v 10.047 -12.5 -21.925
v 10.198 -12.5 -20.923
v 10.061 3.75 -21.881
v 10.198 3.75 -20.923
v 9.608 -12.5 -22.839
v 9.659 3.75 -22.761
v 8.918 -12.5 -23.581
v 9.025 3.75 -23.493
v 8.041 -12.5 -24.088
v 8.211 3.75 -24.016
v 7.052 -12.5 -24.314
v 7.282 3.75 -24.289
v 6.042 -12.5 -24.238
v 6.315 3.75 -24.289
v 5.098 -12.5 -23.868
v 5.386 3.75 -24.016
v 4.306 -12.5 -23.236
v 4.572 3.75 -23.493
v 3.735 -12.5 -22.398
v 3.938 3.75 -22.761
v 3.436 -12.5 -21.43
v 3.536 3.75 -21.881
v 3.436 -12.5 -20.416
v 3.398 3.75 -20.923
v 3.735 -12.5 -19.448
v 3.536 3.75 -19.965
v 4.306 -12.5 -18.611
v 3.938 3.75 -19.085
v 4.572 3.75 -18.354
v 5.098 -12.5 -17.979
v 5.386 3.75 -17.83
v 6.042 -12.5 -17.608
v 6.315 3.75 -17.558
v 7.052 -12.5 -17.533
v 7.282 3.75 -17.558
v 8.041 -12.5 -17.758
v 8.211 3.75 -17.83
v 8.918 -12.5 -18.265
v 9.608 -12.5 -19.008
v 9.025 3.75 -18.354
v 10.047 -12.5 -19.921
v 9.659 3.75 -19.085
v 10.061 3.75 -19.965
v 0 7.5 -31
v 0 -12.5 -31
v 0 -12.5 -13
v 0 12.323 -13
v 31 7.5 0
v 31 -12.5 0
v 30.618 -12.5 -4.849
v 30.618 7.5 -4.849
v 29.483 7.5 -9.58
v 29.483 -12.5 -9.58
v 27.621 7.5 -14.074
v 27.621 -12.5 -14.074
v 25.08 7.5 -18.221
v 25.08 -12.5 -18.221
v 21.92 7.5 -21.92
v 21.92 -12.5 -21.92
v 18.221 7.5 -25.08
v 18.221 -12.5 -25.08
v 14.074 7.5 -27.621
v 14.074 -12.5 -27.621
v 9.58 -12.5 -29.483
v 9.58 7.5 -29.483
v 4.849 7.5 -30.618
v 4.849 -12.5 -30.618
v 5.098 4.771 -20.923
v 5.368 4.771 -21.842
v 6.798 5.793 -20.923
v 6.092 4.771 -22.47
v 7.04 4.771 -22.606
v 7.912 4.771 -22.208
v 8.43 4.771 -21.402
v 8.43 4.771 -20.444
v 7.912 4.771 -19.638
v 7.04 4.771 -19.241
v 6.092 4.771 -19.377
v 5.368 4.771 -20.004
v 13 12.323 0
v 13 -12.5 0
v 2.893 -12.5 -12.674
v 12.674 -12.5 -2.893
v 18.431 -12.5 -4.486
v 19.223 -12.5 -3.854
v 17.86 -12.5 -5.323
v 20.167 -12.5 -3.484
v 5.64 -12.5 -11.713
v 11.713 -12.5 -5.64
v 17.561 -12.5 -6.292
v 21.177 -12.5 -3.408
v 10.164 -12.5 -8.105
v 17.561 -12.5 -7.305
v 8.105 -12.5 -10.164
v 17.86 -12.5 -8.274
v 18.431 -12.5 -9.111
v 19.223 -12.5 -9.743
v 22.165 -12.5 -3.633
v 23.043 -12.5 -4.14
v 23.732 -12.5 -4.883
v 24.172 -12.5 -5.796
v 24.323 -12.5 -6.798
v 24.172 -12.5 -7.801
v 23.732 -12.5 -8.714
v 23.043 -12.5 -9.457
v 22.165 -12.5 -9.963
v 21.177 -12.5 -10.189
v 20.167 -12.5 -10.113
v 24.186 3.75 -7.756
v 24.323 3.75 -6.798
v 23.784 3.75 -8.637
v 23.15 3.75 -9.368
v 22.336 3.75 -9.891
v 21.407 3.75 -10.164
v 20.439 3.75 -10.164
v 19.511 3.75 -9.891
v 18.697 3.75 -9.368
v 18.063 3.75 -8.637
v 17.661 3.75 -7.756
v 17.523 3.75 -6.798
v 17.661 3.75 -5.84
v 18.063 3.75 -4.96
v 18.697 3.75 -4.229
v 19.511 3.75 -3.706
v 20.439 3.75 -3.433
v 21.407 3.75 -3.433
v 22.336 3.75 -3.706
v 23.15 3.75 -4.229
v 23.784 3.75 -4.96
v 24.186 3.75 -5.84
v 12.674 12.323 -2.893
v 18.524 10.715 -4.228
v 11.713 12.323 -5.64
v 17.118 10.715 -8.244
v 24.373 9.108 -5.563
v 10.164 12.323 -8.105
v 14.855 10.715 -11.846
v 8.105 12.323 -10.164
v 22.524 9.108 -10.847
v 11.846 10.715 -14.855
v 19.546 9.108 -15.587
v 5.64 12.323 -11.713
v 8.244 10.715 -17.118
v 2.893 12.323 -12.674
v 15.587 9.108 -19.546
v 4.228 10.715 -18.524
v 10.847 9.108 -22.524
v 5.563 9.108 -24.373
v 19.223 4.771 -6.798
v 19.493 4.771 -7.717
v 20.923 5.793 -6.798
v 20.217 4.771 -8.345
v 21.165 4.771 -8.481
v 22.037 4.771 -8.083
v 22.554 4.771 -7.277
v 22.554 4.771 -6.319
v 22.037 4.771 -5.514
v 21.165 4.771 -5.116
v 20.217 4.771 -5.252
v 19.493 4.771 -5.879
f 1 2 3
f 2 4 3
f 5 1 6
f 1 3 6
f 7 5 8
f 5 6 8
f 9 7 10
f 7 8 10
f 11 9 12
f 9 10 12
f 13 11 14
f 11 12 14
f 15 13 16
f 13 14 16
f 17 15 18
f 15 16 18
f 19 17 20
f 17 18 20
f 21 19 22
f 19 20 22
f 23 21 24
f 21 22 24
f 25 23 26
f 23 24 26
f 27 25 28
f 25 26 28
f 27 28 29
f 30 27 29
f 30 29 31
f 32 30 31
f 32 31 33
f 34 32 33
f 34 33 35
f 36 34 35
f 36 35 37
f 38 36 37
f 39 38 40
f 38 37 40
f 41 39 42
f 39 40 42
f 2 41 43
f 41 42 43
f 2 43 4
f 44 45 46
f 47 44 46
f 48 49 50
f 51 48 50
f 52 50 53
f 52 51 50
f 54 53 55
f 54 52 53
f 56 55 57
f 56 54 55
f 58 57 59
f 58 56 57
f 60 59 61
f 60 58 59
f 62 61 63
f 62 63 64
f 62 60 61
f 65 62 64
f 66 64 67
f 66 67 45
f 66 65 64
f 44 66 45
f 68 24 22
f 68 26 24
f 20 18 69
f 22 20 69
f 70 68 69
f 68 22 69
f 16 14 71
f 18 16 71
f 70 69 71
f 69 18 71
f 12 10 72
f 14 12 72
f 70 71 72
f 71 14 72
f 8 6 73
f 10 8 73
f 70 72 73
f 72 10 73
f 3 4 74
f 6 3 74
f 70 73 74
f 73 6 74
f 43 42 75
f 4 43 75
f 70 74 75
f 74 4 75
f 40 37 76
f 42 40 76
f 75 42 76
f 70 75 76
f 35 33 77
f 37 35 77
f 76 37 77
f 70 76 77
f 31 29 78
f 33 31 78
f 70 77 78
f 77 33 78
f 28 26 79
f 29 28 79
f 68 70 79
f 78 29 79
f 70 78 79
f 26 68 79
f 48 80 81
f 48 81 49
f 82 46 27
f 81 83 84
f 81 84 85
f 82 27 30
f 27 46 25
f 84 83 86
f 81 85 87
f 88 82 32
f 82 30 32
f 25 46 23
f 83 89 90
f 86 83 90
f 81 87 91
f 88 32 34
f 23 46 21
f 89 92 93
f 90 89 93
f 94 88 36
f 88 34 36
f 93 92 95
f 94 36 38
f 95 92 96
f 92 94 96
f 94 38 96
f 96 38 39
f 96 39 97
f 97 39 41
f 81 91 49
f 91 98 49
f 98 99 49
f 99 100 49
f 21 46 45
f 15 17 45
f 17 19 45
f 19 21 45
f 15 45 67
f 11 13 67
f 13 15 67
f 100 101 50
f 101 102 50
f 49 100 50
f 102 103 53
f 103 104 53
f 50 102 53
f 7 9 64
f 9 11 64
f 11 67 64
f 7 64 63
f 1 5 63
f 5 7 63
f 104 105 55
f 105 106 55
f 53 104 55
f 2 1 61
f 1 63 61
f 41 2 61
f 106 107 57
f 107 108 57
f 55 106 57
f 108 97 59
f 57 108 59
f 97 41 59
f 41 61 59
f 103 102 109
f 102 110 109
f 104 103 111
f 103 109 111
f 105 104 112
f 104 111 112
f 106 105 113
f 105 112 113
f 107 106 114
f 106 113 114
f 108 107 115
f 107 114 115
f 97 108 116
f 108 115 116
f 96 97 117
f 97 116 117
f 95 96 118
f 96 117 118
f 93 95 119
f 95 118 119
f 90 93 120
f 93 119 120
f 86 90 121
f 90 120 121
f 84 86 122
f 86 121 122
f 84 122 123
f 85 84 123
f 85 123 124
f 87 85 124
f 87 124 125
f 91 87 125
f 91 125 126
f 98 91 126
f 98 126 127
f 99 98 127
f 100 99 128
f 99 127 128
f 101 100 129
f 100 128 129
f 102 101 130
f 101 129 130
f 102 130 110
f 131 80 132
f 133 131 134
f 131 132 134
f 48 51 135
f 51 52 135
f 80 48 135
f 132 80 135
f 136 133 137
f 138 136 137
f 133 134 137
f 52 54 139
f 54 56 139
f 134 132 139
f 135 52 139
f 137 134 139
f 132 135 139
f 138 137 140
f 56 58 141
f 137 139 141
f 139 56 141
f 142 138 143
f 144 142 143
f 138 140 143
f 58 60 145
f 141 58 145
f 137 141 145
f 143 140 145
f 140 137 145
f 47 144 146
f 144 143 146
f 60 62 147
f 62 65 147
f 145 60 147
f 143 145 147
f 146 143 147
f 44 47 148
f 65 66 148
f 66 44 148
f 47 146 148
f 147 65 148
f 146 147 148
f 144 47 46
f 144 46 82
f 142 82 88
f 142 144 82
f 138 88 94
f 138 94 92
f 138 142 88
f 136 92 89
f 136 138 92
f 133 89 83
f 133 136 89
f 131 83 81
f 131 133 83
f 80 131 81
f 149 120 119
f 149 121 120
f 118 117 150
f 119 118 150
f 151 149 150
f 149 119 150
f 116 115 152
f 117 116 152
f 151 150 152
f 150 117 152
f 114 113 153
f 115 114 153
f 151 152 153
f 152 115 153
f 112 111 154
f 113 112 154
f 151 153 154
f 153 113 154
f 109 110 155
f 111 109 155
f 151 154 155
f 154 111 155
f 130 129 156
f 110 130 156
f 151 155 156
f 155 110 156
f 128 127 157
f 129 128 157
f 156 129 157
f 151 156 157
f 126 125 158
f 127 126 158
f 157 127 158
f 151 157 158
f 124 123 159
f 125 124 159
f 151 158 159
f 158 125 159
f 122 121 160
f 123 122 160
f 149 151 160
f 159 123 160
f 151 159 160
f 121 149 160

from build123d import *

# Parameters (mm, degrees)
AUFSATZ_LINEAR_AUSTRAGEN1_DEPTH = 12.5
M8_GEWINDEBOHRUNG1_D            = 6.8
M8_GEWINDEBOHRUNG1_DEPTH        = 16.25
M8_GEWINDEBOHRUNG1_TIP          = 2.042926105


with BuildPart() as part:
    # Skizze1 → Aufsatz-Linear austragen1 (new, symmetric)
    with BuildSketch(Plane(origin=(0, 0, 0), x_dir=(1, 0, 0), z_dir=(0, 1, 0))):
        with BuildLine():
            Line((0, 31), (0, 13))
            ThreePointArc((0, 13), (9.192388155, 9.192388155), (13, 0))
            Line((13, 0), (31, 0))
            ThreePointArc((31, 0), (21.920310217, 21.920310217), (0, 31))
        make_face()
    extrude(amount=AUFSATZ_LINEAR_AUSTRAGEN1_DEPTH, both=True)

    # Schnitt-Austragung1: sweep along a curve in space
    with BuildLine() as schnitt_austragung1_path:
        ThreePointArc((31, 12.5, 0), (21.920310217, 12.5, -21.920310217), (0, 12.5, -31))
    # Skizze2 → Schnitt-Austragung1 (sweep, cut)
    with BuildSketch(Plane.XY):
        Polygon((13, 12.5), (31, 12.5), (31, 7.5), (13, 12.323085464), align=None)
    sweep(path=schnitt_austragung1_path.line, mode=Mode.SUBTRACT)

    # M8 Gewindebohrung1
    with Locations(Plane(origin=(0, -12.5, 0), x_dir=(-1, 0, 0), z_dir=(0, -1, 0))):
        with Locations((-6.798373876, 20.923243358), (-20.923243358, 6.798373876)):
            Hole(M8_GEWINDEBOHRUNG1_D / 2, depth=M8_GEWINDEBOHRUNG1_DEPTH)
            with Locations((0, 0, -(M8_GEWINDEBOHRUNG1_DEPTH + M8_GEWINDEBOHRUNG1_TIP / 2))):  # 118° drill point
                Cone(0, M8_GEWINDEBOHRUNG1_D / 2, M8_GEWINDEBOHRUNG1_TIP, mode=Mode.SUBTRACT)


solid = part.part
